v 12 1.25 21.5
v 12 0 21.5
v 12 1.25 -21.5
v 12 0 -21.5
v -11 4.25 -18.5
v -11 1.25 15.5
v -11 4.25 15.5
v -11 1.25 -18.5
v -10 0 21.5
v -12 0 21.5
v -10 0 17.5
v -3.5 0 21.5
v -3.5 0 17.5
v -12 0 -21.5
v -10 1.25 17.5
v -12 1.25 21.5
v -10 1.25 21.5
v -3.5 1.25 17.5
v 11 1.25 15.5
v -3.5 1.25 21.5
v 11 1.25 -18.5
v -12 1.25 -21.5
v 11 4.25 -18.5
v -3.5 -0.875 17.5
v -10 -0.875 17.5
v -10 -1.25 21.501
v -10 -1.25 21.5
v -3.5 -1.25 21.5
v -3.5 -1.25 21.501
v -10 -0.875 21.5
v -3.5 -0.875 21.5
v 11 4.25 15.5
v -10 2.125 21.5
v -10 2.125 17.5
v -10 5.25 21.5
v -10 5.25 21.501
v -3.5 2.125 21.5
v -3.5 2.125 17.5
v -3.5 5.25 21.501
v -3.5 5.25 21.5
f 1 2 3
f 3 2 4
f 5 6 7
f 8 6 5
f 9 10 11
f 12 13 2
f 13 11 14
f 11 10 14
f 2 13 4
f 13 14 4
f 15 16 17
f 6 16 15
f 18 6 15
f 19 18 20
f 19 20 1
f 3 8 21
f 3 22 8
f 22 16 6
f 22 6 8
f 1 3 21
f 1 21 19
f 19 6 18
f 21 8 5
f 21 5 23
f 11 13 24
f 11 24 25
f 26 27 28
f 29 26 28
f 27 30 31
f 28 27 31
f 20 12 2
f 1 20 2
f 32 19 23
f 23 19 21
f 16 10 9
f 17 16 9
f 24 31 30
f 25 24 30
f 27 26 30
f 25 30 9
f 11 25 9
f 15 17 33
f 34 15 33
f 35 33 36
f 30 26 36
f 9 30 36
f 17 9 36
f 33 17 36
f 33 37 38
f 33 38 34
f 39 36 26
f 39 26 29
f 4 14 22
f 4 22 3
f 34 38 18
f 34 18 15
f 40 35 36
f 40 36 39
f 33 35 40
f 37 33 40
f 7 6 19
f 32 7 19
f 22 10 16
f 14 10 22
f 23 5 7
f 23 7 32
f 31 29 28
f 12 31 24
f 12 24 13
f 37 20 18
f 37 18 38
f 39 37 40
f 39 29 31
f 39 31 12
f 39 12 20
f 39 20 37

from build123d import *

# Parameters (mm, degrees)
SKETCH1_W               = 24
SKETCH1_H               = 43
PCB_DEPTH               = 1.25
SKETCH2_W               = 22
SKETCH2_H               = 34
RF_CASING_DEPTH         = 3
SKETCH3_W               = 6.5
SKETCH3_H               = 6.5
RF_CONNECTOR_BACK_DEPTH = 0.001
SKETCH5_W               = 6.5
SKETCH5_H               = 3
RF_CONNECTOR_PINS_DEPTH = 4


with BuildPart() as part:
    # Sketch1 → PCB (new body)
    with BuildSketch(Plane(origin=(0, 0, 0), x_dir=(1, 0, 0), z_dir=(0, 1, 0))):
        Rectangle(SKETCH1_W, SKETCH1_H)
    extrude(amount=PCB_DEPTH)

    # Sketch2 → RF Casing (add)
    with BuildSketch(Plane(origin=(0, 1.25, 0), x_dir=(1, 0, 0), z_dir=(0, 1, 0))):
        with Locations((0, 1.5)):
            Rectangle(SKETCH2_W, SKETCH2_H)
    extrude(amount=RF_CASING_DEPTH)

    # Sketch3 → RF Connector Back (add)
    with BuildSketch(Plane.XY.offset(21.5)):
        with Locations((-6.75, 2)):
            Rectangle(SKETCH3_W, SKETCH3_H)
    extrude(amount=RF_CONNECTOR_BACK_DEPTH)

    # Sketch5 → RF Connector Pins (add)
    with BuildSketch(Plane(origin=(0, 0, 21.5), x_dir=(-1, 0, 0), z_dir=(0, 0, -1))):
        with Locations((6.75, 0.625)):
            Rectangle(SKETCH5_W, SKETCH5_H)
    extrude(amount=RF_CONNECTOR_PINS_DEPTH)


solid = part.part
